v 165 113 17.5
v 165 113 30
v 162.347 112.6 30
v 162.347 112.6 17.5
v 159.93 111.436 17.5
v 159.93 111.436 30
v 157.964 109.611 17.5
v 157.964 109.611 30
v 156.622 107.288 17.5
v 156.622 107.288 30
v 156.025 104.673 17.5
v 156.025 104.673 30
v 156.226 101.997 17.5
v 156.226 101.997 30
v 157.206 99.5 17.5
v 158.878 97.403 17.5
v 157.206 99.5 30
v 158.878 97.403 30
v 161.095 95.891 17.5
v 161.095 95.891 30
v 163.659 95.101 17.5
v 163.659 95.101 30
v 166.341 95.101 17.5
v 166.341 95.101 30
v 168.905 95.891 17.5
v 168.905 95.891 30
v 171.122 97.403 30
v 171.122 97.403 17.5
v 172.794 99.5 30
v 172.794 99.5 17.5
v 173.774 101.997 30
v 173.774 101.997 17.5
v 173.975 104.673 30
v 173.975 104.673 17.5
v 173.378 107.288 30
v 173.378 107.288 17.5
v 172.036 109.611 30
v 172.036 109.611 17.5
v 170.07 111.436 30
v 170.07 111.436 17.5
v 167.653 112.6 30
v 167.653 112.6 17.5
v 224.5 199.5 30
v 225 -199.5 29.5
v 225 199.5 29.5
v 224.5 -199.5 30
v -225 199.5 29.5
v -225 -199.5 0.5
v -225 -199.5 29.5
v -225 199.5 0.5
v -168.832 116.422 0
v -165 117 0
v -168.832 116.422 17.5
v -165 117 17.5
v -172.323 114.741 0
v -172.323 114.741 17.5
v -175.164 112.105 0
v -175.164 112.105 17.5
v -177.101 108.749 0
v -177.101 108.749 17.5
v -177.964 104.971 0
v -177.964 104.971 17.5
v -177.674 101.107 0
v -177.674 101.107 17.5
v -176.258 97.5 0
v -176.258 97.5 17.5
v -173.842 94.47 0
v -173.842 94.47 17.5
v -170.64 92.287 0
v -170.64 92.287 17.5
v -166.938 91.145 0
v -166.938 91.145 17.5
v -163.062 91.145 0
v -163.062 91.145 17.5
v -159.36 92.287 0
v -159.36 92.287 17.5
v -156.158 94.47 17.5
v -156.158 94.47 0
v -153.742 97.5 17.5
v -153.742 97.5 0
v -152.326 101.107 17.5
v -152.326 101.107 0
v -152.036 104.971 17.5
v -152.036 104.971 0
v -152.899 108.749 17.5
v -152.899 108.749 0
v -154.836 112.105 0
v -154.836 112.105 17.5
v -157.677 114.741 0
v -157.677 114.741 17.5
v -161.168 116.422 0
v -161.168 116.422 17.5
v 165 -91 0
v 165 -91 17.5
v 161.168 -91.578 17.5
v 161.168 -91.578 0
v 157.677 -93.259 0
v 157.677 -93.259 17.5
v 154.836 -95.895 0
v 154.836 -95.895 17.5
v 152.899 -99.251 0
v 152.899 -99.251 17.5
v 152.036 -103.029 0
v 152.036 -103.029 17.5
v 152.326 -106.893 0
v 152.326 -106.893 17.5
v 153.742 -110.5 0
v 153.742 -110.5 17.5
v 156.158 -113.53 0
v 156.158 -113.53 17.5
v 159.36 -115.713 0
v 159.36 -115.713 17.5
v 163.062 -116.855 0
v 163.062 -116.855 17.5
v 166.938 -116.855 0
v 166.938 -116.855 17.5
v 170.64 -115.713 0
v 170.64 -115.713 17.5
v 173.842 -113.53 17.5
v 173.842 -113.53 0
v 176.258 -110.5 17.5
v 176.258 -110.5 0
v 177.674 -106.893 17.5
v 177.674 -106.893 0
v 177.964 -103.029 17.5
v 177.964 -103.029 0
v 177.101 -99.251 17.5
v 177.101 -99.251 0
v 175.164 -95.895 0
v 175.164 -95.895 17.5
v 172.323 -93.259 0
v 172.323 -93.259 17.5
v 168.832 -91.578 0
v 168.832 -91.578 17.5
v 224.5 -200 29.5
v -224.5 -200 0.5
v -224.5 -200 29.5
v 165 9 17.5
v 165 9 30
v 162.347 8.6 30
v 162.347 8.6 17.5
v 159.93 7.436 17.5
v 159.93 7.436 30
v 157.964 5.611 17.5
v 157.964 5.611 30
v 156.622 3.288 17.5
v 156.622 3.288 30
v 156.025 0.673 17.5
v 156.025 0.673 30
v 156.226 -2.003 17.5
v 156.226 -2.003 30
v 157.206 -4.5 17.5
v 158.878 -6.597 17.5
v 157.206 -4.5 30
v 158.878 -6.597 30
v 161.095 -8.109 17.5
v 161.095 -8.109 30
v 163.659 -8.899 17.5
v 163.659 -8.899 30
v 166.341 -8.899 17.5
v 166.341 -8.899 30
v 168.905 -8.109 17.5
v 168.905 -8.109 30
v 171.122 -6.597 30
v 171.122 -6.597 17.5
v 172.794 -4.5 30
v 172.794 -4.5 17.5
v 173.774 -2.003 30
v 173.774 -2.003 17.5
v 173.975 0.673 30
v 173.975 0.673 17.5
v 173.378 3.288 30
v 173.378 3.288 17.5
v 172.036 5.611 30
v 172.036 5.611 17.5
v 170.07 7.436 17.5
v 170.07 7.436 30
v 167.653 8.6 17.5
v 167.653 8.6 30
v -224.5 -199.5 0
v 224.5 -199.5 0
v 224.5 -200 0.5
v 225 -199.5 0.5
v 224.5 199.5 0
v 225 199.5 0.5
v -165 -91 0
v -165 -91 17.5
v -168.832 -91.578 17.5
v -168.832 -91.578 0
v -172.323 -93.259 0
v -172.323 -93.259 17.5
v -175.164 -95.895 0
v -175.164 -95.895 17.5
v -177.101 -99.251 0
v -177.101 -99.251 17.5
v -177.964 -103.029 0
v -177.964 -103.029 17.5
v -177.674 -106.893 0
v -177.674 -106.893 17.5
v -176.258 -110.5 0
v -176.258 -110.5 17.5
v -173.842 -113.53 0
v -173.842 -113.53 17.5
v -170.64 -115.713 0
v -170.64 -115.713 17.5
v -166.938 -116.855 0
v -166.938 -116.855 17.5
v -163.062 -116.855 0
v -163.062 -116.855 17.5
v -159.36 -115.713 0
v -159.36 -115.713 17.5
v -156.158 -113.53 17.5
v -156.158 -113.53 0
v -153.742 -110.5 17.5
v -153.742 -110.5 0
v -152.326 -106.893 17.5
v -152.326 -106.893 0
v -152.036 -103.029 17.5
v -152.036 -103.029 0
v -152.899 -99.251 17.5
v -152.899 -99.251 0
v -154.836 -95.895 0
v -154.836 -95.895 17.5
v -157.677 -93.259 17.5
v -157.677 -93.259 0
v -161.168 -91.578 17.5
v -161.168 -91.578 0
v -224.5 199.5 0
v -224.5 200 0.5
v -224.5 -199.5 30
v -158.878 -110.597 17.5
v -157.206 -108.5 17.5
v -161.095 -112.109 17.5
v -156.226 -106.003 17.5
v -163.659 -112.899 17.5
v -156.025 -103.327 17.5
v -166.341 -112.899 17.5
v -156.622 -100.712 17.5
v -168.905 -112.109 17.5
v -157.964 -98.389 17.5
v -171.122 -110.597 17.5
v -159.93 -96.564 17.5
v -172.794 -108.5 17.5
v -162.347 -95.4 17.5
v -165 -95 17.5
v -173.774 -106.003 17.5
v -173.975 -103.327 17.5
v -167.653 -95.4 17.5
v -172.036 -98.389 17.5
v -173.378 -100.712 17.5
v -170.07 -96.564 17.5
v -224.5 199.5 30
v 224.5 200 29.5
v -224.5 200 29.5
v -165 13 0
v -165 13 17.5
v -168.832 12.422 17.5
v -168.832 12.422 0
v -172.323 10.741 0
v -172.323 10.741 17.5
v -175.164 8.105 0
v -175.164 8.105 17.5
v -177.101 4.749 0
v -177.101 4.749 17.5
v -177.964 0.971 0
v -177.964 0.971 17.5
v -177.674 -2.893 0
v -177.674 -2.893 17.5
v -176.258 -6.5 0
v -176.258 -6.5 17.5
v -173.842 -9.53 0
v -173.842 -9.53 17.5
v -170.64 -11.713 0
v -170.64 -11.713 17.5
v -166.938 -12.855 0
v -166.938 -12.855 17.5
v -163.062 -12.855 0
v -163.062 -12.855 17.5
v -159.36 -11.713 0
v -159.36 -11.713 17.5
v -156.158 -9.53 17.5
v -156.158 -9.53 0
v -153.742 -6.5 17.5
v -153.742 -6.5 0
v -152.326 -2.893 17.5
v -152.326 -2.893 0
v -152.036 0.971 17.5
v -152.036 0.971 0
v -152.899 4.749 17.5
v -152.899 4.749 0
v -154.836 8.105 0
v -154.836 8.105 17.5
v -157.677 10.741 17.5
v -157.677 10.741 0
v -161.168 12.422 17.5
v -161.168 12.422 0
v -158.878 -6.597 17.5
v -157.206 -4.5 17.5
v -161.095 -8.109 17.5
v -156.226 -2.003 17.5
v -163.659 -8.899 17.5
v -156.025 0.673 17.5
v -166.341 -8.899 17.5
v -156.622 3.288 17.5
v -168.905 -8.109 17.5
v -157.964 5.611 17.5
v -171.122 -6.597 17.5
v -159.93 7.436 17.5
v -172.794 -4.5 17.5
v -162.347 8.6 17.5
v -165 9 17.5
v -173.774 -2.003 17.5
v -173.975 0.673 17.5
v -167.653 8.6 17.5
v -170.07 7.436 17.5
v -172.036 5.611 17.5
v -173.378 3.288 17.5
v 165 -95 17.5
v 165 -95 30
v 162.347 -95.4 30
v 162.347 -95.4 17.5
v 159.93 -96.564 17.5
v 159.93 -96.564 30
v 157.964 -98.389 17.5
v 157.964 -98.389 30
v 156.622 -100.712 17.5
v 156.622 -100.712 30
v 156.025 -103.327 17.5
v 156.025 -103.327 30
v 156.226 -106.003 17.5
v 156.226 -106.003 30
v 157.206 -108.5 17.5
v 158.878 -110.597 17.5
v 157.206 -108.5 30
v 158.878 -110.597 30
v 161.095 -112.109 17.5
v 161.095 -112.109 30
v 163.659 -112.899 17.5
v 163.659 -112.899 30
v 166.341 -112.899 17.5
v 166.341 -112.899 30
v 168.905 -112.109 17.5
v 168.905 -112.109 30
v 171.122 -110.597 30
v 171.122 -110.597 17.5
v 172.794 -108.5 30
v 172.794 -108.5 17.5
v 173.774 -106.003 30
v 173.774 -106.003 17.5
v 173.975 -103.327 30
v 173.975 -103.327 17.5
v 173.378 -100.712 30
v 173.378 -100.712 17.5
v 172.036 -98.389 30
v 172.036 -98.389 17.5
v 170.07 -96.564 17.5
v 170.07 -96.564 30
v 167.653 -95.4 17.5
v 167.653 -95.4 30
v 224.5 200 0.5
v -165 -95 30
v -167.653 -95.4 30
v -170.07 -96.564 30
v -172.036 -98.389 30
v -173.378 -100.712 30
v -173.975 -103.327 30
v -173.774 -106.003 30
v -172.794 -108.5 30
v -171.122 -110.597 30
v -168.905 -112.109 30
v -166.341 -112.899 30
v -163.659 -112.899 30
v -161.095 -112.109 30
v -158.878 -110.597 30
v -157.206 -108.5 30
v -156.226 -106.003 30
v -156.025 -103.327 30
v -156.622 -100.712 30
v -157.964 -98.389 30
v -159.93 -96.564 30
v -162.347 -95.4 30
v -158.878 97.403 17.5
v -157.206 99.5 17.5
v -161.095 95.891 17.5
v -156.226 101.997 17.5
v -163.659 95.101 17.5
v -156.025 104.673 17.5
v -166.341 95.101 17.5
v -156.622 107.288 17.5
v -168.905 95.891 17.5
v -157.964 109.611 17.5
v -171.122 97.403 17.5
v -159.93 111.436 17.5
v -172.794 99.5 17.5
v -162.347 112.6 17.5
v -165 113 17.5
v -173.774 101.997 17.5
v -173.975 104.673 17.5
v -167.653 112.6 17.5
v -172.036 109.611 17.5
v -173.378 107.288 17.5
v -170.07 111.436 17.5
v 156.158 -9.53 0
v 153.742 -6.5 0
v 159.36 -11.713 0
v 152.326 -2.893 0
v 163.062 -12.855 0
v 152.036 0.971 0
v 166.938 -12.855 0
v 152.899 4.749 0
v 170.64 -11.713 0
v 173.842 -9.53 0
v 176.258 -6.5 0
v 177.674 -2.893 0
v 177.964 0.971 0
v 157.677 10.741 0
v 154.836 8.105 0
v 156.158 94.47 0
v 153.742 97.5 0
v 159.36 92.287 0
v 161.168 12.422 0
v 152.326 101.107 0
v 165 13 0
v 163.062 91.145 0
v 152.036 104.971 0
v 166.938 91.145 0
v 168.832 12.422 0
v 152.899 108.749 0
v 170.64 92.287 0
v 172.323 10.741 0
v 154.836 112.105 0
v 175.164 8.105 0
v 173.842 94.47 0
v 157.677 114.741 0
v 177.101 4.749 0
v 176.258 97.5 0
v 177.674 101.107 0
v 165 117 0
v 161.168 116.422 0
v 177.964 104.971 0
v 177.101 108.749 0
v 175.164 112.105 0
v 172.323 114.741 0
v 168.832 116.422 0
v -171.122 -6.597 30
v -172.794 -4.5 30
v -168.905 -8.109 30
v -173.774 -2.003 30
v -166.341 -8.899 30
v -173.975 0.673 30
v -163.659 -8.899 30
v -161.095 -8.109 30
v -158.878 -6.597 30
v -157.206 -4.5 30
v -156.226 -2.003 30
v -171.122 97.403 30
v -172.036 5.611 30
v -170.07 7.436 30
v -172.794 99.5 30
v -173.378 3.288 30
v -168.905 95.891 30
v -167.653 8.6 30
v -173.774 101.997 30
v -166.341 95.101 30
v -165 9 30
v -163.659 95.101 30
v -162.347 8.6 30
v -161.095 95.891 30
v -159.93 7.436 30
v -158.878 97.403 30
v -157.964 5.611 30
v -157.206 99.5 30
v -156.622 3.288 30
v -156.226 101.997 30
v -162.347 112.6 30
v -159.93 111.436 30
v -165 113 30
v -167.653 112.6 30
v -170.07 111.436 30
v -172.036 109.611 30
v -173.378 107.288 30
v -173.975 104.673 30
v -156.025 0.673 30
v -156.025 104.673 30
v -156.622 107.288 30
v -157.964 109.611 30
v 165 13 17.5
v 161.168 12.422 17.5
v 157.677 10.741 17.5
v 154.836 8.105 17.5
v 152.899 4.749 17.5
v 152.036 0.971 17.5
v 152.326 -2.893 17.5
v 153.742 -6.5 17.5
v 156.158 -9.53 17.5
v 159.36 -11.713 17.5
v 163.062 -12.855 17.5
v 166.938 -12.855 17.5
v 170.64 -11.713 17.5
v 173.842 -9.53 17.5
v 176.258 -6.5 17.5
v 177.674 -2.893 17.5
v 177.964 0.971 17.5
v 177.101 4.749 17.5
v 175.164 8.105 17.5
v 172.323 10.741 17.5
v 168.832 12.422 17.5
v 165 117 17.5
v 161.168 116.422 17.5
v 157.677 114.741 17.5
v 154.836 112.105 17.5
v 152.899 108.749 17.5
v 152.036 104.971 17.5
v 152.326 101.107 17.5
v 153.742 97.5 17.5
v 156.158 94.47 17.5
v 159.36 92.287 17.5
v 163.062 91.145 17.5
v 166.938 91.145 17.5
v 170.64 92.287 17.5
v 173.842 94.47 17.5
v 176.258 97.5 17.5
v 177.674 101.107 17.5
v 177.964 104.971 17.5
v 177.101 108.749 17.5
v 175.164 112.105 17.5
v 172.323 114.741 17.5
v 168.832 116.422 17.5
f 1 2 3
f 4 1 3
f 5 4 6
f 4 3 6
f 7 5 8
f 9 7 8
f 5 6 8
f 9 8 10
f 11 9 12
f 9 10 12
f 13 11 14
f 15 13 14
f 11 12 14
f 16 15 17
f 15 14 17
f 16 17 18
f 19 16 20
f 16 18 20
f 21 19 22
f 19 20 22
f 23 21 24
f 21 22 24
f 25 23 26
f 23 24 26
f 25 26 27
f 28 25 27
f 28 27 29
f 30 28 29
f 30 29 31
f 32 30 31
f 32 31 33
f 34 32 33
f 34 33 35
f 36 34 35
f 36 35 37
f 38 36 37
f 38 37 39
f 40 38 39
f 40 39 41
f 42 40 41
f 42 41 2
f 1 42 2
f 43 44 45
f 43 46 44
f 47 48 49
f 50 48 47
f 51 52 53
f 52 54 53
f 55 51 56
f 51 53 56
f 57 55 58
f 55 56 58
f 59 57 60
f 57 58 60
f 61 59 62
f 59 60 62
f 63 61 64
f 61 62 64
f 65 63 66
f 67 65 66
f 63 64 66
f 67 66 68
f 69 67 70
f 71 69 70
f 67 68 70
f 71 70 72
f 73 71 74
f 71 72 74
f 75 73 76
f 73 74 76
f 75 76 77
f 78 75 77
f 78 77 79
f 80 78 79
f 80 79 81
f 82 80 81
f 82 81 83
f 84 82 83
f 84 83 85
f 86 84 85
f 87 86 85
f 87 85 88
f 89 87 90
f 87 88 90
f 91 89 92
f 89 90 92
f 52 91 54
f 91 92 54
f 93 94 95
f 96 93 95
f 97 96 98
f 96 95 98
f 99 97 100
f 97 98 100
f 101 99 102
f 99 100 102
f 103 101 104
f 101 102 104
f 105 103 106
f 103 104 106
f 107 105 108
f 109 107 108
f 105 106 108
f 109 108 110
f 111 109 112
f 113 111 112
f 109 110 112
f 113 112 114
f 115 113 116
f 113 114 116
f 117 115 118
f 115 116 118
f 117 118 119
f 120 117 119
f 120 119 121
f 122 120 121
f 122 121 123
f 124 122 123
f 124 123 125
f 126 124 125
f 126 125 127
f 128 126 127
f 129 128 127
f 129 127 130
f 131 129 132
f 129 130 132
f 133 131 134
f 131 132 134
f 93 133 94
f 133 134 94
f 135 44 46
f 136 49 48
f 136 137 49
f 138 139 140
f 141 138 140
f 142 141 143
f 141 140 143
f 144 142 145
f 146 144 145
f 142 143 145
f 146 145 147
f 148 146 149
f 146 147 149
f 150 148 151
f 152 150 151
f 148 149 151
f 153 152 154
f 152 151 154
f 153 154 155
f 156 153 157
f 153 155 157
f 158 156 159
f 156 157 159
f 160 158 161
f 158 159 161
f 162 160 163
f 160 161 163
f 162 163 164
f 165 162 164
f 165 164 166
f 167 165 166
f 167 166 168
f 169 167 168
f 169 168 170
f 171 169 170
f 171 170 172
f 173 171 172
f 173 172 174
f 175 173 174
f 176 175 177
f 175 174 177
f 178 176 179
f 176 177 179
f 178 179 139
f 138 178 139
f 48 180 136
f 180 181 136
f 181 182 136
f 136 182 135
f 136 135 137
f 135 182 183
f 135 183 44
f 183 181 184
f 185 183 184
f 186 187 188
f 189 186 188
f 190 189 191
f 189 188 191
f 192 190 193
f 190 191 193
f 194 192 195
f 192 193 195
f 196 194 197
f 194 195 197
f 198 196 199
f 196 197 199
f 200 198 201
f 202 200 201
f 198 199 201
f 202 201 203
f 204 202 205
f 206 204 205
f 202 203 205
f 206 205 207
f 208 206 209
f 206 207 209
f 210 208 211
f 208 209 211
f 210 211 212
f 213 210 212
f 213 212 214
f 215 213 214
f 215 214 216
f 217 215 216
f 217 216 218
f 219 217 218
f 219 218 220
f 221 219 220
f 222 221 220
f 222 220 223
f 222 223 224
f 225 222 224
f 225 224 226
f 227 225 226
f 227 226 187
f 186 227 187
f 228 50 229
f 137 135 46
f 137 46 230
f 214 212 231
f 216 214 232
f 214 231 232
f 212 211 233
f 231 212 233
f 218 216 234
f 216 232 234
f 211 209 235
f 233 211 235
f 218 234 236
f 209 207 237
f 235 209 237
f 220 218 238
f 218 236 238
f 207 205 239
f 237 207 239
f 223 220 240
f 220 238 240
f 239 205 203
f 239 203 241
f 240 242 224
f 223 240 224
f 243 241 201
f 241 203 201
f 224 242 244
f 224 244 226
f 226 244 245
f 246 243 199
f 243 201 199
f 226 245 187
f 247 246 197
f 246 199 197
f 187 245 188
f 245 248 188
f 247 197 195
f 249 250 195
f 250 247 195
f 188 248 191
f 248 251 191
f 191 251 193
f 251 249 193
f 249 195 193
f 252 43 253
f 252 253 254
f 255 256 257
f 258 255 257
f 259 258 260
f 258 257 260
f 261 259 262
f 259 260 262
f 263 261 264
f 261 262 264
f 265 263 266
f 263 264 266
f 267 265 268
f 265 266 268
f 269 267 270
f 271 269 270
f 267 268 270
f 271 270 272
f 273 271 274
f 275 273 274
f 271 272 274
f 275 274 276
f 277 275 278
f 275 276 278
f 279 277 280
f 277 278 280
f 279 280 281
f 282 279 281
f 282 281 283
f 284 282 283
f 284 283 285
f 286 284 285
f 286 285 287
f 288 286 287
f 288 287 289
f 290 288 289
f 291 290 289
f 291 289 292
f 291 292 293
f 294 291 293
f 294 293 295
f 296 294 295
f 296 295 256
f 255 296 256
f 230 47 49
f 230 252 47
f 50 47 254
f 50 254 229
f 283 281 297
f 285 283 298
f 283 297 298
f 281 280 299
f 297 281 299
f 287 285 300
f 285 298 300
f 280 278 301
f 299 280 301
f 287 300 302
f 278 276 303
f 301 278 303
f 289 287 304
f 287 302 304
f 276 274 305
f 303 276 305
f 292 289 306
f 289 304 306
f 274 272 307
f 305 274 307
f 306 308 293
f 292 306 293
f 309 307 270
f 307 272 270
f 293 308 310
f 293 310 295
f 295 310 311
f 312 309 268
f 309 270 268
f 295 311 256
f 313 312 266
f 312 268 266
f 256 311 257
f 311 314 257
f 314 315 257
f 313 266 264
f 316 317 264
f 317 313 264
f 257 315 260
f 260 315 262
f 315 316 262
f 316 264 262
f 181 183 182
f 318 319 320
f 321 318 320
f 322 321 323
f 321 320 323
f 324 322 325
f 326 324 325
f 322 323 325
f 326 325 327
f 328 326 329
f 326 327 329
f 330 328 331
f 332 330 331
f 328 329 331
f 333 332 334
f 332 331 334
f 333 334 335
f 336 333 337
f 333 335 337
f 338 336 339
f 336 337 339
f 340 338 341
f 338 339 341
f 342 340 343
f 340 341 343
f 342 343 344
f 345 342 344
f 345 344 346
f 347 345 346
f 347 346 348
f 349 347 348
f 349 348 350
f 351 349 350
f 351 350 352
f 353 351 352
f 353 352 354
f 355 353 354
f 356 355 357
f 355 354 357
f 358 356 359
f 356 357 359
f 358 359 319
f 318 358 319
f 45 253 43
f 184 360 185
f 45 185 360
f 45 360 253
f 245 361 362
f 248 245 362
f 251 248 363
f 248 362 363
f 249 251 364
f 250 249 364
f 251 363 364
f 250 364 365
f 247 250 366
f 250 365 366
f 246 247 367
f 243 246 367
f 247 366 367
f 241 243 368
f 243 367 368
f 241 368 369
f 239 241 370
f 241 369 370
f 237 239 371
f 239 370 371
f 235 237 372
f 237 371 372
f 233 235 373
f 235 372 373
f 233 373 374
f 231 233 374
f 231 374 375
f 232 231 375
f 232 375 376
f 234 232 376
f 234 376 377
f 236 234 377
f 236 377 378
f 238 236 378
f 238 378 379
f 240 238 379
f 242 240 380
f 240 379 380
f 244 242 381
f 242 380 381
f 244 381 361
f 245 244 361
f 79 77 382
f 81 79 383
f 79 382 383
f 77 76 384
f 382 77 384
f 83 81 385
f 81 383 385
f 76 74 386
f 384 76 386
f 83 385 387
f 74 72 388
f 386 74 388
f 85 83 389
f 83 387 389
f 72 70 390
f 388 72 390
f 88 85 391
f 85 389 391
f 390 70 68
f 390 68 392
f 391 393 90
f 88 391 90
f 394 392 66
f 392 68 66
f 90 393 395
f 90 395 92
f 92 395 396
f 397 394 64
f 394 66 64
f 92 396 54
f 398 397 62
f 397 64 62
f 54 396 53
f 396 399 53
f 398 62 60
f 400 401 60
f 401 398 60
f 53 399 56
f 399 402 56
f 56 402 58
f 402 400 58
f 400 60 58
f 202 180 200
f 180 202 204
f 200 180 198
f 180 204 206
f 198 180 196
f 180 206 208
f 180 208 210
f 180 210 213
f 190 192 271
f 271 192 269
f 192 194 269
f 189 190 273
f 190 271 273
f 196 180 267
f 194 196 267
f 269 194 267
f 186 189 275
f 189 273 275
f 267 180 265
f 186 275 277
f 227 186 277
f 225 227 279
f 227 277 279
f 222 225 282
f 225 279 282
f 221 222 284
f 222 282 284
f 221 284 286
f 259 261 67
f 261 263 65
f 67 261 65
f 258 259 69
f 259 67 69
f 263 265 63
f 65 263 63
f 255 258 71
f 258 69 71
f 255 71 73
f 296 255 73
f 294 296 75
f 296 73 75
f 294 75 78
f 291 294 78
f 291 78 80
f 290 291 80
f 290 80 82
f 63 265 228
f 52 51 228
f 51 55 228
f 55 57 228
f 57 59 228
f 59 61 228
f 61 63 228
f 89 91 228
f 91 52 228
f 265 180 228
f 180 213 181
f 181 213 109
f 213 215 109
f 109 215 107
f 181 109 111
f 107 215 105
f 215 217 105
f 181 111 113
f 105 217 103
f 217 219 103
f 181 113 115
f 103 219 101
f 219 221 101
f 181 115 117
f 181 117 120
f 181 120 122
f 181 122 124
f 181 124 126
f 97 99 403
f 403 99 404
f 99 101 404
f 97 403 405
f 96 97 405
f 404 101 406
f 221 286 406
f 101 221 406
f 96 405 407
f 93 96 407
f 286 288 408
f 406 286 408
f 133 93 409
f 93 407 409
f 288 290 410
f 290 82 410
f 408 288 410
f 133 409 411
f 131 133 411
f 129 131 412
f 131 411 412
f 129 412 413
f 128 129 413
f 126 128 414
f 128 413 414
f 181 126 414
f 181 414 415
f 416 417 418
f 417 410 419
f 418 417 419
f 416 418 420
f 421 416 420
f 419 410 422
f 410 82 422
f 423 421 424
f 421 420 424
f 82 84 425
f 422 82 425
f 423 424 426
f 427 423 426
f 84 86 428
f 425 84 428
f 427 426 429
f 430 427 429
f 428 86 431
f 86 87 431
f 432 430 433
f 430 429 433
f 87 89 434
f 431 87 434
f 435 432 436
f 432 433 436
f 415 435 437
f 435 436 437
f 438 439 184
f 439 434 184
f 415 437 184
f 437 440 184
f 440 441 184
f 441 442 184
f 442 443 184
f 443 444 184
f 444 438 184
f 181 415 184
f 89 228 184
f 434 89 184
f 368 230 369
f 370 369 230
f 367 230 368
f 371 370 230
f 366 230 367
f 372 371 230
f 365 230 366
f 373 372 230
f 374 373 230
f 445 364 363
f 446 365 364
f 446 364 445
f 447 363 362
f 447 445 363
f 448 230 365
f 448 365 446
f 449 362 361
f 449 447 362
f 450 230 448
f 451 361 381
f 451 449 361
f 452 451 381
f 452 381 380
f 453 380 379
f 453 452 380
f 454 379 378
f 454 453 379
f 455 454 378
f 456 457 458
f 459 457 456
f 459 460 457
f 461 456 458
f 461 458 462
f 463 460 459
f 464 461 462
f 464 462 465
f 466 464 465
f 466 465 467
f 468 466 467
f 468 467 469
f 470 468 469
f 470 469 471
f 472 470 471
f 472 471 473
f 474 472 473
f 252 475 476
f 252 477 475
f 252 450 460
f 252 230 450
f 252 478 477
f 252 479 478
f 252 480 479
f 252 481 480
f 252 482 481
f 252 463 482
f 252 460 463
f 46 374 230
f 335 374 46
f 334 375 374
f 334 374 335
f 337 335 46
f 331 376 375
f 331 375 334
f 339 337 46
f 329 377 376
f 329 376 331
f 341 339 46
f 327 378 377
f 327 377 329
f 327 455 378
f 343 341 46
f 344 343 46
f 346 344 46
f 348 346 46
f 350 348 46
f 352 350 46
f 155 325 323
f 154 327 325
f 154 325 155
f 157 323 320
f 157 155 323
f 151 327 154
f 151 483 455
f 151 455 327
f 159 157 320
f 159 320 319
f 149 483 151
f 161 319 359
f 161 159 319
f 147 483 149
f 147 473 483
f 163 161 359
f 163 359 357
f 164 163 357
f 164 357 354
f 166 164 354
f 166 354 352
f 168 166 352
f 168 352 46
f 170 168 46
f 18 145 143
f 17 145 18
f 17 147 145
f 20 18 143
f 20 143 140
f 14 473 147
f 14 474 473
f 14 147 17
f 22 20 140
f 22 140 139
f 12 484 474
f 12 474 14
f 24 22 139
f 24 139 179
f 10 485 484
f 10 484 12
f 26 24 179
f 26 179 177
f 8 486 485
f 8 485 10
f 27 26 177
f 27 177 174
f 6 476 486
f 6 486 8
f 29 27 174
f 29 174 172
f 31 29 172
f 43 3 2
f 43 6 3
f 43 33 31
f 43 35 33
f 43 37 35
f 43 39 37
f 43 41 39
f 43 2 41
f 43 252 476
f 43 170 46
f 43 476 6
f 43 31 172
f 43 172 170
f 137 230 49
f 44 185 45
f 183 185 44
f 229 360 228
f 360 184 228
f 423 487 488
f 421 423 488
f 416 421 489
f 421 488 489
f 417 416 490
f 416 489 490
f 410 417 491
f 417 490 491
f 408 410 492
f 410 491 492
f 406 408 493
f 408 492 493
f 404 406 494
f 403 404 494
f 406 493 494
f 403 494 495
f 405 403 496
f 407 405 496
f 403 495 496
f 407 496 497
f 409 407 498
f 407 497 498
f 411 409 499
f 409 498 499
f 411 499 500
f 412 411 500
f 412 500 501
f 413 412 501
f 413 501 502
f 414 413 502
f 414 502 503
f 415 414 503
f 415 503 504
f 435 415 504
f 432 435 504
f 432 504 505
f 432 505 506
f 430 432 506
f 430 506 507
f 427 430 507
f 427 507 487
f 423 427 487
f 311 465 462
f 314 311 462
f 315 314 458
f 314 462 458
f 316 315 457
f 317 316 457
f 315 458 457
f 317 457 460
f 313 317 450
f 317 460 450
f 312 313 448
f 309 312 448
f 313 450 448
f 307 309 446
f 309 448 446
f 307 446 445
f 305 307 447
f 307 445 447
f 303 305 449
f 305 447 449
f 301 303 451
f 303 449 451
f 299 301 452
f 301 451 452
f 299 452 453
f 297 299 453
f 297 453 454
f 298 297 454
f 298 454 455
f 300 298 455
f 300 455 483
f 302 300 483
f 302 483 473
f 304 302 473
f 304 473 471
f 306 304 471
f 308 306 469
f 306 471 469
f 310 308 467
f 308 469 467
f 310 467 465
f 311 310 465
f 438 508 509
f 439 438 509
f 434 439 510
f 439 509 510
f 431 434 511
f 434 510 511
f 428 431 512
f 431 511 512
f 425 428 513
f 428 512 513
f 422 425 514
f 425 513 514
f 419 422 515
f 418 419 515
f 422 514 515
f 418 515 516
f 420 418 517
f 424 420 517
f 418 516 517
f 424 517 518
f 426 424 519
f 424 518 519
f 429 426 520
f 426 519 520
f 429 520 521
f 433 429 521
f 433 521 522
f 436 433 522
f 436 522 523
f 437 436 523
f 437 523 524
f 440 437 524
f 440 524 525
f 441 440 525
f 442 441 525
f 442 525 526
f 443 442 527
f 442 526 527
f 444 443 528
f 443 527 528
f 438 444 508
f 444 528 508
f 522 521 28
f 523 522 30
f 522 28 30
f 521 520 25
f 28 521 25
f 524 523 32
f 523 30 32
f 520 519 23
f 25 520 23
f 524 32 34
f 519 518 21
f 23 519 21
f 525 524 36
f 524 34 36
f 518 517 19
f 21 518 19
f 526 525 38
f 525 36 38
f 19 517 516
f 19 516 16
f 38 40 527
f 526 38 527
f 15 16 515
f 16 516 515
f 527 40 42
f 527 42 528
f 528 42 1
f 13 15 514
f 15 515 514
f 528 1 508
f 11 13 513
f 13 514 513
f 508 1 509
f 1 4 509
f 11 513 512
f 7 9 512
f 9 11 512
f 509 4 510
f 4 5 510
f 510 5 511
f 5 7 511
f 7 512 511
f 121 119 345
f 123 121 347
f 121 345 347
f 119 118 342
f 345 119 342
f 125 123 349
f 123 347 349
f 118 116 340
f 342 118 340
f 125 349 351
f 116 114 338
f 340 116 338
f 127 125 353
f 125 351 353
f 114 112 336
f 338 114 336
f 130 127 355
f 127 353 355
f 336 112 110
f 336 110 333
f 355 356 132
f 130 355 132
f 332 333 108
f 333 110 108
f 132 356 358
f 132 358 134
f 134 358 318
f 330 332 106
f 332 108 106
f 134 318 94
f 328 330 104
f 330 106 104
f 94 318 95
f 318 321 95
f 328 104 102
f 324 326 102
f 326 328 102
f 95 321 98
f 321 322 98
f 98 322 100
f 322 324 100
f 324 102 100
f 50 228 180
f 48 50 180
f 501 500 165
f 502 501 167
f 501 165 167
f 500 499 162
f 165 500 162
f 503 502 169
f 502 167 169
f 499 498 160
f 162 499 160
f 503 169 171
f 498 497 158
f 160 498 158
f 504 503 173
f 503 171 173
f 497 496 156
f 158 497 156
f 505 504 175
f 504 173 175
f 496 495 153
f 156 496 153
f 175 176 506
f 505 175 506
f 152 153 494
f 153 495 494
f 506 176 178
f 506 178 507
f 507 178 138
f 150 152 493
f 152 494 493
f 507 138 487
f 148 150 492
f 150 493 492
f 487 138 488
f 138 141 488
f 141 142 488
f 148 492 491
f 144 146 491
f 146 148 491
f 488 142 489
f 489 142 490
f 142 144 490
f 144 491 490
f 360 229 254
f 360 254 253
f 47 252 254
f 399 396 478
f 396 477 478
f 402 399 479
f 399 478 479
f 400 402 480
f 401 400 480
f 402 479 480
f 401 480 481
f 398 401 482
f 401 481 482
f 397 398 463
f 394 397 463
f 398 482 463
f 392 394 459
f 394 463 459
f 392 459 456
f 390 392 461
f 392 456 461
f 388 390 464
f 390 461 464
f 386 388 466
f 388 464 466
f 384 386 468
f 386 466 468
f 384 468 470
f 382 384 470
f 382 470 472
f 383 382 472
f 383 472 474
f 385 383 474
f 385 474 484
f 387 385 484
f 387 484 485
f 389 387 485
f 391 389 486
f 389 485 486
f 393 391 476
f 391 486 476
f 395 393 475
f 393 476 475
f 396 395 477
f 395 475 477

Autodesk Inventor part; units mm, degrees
ref_plane "YZ Plane" through (0, 0, 0) normal (1, 0, 0) x (0, 1, 0)
ref_plane "XZ Plane" through (0, 0, 0) normal (0, 1, 0) x (-1, 0, 0)
ref_plane "XY Plane" through (0, 0, 0) normal (0, 0, 1) x (1, 0, 0)
sketch "Sketch1" plane through (0, 0, 0) normal (0, 0, 1) x (1, 0, 0)
  line L0 (-225, 200) -> (225, 200)
  line L1 (225, 200) -> (225, -200)
  line L2 (225, -200) -> (-225, -200)
  line L3 (-225, -200) -> (-225, 200)
  circle A0 centre (0, 0) radius 17.5
  point P0 (-225, 0)
  point P1 (0, 200)
  point P2 (-165, 104)
  dimension "d72" = 450
  dimension "d73" = 400
  dimension "d74" = 35
  dimension "d75" = 165
  dimension "d76" = 104
extrude "Extrusion1" add sketch "Sketch1" along normal blind 30 contours L0 L1 L2 L3 | A0
hole "Hole1" at (-165, 104, 0) direction (0, 0, 1) diameter 18 depth 30 counterbore diameter 26 counterbore depth 17.5
pattern_linear "Rectangular Pattern1" count 3 spacing 104 along (0, -1, 0) count 2 spacing 330 along (1, 0, 0) of "Hole1"
extrude "Extrusion2" [suppressed]
chamfer "Chamfer1" distance 0.5 angle 45 12 edges at (0, 200, 30) (-225, 0, 30) (-225, 200, 15) (-225, 0, 0) (0, 200, 0) (225, 200, 15) (225, 0, 30) (225, 0, 0) (225, -200, 15) (0, -200, 30) (0, -200, 0) (-225, -200, 15)
equation "\"d72\" = W_"
equation "\"d73\" = L"
equation "\"d74\" = dB"
equation "\"d75\" = 0.5 * S1_W"
equation "\"d76\" = 0.5 * S1_L"
equation "\"d77\" = H_"
equation "\"d79\" = S1_d1"
equation "\"d81\" = S1_d2"
equation "\"d82\" = S1_k"
equation "\"d84\" = H_"
equation "\"d92\" = H_"
equation "\"L\" = 400"
equation "\"W_\" = 450"
equation "\"H_\" = 30"
equation "\"S1_d1\" = 18"
equation "\"S1_d2\" = 26"
equation "\"S1_k\" = 17.5"
equation "\"S1_L\" = 208"
equation "\"dB\" = 35"
equation "\"S1_W\" = 330"
properties part number "SA-BCP-400x450x30x330" material "S 55 C"
